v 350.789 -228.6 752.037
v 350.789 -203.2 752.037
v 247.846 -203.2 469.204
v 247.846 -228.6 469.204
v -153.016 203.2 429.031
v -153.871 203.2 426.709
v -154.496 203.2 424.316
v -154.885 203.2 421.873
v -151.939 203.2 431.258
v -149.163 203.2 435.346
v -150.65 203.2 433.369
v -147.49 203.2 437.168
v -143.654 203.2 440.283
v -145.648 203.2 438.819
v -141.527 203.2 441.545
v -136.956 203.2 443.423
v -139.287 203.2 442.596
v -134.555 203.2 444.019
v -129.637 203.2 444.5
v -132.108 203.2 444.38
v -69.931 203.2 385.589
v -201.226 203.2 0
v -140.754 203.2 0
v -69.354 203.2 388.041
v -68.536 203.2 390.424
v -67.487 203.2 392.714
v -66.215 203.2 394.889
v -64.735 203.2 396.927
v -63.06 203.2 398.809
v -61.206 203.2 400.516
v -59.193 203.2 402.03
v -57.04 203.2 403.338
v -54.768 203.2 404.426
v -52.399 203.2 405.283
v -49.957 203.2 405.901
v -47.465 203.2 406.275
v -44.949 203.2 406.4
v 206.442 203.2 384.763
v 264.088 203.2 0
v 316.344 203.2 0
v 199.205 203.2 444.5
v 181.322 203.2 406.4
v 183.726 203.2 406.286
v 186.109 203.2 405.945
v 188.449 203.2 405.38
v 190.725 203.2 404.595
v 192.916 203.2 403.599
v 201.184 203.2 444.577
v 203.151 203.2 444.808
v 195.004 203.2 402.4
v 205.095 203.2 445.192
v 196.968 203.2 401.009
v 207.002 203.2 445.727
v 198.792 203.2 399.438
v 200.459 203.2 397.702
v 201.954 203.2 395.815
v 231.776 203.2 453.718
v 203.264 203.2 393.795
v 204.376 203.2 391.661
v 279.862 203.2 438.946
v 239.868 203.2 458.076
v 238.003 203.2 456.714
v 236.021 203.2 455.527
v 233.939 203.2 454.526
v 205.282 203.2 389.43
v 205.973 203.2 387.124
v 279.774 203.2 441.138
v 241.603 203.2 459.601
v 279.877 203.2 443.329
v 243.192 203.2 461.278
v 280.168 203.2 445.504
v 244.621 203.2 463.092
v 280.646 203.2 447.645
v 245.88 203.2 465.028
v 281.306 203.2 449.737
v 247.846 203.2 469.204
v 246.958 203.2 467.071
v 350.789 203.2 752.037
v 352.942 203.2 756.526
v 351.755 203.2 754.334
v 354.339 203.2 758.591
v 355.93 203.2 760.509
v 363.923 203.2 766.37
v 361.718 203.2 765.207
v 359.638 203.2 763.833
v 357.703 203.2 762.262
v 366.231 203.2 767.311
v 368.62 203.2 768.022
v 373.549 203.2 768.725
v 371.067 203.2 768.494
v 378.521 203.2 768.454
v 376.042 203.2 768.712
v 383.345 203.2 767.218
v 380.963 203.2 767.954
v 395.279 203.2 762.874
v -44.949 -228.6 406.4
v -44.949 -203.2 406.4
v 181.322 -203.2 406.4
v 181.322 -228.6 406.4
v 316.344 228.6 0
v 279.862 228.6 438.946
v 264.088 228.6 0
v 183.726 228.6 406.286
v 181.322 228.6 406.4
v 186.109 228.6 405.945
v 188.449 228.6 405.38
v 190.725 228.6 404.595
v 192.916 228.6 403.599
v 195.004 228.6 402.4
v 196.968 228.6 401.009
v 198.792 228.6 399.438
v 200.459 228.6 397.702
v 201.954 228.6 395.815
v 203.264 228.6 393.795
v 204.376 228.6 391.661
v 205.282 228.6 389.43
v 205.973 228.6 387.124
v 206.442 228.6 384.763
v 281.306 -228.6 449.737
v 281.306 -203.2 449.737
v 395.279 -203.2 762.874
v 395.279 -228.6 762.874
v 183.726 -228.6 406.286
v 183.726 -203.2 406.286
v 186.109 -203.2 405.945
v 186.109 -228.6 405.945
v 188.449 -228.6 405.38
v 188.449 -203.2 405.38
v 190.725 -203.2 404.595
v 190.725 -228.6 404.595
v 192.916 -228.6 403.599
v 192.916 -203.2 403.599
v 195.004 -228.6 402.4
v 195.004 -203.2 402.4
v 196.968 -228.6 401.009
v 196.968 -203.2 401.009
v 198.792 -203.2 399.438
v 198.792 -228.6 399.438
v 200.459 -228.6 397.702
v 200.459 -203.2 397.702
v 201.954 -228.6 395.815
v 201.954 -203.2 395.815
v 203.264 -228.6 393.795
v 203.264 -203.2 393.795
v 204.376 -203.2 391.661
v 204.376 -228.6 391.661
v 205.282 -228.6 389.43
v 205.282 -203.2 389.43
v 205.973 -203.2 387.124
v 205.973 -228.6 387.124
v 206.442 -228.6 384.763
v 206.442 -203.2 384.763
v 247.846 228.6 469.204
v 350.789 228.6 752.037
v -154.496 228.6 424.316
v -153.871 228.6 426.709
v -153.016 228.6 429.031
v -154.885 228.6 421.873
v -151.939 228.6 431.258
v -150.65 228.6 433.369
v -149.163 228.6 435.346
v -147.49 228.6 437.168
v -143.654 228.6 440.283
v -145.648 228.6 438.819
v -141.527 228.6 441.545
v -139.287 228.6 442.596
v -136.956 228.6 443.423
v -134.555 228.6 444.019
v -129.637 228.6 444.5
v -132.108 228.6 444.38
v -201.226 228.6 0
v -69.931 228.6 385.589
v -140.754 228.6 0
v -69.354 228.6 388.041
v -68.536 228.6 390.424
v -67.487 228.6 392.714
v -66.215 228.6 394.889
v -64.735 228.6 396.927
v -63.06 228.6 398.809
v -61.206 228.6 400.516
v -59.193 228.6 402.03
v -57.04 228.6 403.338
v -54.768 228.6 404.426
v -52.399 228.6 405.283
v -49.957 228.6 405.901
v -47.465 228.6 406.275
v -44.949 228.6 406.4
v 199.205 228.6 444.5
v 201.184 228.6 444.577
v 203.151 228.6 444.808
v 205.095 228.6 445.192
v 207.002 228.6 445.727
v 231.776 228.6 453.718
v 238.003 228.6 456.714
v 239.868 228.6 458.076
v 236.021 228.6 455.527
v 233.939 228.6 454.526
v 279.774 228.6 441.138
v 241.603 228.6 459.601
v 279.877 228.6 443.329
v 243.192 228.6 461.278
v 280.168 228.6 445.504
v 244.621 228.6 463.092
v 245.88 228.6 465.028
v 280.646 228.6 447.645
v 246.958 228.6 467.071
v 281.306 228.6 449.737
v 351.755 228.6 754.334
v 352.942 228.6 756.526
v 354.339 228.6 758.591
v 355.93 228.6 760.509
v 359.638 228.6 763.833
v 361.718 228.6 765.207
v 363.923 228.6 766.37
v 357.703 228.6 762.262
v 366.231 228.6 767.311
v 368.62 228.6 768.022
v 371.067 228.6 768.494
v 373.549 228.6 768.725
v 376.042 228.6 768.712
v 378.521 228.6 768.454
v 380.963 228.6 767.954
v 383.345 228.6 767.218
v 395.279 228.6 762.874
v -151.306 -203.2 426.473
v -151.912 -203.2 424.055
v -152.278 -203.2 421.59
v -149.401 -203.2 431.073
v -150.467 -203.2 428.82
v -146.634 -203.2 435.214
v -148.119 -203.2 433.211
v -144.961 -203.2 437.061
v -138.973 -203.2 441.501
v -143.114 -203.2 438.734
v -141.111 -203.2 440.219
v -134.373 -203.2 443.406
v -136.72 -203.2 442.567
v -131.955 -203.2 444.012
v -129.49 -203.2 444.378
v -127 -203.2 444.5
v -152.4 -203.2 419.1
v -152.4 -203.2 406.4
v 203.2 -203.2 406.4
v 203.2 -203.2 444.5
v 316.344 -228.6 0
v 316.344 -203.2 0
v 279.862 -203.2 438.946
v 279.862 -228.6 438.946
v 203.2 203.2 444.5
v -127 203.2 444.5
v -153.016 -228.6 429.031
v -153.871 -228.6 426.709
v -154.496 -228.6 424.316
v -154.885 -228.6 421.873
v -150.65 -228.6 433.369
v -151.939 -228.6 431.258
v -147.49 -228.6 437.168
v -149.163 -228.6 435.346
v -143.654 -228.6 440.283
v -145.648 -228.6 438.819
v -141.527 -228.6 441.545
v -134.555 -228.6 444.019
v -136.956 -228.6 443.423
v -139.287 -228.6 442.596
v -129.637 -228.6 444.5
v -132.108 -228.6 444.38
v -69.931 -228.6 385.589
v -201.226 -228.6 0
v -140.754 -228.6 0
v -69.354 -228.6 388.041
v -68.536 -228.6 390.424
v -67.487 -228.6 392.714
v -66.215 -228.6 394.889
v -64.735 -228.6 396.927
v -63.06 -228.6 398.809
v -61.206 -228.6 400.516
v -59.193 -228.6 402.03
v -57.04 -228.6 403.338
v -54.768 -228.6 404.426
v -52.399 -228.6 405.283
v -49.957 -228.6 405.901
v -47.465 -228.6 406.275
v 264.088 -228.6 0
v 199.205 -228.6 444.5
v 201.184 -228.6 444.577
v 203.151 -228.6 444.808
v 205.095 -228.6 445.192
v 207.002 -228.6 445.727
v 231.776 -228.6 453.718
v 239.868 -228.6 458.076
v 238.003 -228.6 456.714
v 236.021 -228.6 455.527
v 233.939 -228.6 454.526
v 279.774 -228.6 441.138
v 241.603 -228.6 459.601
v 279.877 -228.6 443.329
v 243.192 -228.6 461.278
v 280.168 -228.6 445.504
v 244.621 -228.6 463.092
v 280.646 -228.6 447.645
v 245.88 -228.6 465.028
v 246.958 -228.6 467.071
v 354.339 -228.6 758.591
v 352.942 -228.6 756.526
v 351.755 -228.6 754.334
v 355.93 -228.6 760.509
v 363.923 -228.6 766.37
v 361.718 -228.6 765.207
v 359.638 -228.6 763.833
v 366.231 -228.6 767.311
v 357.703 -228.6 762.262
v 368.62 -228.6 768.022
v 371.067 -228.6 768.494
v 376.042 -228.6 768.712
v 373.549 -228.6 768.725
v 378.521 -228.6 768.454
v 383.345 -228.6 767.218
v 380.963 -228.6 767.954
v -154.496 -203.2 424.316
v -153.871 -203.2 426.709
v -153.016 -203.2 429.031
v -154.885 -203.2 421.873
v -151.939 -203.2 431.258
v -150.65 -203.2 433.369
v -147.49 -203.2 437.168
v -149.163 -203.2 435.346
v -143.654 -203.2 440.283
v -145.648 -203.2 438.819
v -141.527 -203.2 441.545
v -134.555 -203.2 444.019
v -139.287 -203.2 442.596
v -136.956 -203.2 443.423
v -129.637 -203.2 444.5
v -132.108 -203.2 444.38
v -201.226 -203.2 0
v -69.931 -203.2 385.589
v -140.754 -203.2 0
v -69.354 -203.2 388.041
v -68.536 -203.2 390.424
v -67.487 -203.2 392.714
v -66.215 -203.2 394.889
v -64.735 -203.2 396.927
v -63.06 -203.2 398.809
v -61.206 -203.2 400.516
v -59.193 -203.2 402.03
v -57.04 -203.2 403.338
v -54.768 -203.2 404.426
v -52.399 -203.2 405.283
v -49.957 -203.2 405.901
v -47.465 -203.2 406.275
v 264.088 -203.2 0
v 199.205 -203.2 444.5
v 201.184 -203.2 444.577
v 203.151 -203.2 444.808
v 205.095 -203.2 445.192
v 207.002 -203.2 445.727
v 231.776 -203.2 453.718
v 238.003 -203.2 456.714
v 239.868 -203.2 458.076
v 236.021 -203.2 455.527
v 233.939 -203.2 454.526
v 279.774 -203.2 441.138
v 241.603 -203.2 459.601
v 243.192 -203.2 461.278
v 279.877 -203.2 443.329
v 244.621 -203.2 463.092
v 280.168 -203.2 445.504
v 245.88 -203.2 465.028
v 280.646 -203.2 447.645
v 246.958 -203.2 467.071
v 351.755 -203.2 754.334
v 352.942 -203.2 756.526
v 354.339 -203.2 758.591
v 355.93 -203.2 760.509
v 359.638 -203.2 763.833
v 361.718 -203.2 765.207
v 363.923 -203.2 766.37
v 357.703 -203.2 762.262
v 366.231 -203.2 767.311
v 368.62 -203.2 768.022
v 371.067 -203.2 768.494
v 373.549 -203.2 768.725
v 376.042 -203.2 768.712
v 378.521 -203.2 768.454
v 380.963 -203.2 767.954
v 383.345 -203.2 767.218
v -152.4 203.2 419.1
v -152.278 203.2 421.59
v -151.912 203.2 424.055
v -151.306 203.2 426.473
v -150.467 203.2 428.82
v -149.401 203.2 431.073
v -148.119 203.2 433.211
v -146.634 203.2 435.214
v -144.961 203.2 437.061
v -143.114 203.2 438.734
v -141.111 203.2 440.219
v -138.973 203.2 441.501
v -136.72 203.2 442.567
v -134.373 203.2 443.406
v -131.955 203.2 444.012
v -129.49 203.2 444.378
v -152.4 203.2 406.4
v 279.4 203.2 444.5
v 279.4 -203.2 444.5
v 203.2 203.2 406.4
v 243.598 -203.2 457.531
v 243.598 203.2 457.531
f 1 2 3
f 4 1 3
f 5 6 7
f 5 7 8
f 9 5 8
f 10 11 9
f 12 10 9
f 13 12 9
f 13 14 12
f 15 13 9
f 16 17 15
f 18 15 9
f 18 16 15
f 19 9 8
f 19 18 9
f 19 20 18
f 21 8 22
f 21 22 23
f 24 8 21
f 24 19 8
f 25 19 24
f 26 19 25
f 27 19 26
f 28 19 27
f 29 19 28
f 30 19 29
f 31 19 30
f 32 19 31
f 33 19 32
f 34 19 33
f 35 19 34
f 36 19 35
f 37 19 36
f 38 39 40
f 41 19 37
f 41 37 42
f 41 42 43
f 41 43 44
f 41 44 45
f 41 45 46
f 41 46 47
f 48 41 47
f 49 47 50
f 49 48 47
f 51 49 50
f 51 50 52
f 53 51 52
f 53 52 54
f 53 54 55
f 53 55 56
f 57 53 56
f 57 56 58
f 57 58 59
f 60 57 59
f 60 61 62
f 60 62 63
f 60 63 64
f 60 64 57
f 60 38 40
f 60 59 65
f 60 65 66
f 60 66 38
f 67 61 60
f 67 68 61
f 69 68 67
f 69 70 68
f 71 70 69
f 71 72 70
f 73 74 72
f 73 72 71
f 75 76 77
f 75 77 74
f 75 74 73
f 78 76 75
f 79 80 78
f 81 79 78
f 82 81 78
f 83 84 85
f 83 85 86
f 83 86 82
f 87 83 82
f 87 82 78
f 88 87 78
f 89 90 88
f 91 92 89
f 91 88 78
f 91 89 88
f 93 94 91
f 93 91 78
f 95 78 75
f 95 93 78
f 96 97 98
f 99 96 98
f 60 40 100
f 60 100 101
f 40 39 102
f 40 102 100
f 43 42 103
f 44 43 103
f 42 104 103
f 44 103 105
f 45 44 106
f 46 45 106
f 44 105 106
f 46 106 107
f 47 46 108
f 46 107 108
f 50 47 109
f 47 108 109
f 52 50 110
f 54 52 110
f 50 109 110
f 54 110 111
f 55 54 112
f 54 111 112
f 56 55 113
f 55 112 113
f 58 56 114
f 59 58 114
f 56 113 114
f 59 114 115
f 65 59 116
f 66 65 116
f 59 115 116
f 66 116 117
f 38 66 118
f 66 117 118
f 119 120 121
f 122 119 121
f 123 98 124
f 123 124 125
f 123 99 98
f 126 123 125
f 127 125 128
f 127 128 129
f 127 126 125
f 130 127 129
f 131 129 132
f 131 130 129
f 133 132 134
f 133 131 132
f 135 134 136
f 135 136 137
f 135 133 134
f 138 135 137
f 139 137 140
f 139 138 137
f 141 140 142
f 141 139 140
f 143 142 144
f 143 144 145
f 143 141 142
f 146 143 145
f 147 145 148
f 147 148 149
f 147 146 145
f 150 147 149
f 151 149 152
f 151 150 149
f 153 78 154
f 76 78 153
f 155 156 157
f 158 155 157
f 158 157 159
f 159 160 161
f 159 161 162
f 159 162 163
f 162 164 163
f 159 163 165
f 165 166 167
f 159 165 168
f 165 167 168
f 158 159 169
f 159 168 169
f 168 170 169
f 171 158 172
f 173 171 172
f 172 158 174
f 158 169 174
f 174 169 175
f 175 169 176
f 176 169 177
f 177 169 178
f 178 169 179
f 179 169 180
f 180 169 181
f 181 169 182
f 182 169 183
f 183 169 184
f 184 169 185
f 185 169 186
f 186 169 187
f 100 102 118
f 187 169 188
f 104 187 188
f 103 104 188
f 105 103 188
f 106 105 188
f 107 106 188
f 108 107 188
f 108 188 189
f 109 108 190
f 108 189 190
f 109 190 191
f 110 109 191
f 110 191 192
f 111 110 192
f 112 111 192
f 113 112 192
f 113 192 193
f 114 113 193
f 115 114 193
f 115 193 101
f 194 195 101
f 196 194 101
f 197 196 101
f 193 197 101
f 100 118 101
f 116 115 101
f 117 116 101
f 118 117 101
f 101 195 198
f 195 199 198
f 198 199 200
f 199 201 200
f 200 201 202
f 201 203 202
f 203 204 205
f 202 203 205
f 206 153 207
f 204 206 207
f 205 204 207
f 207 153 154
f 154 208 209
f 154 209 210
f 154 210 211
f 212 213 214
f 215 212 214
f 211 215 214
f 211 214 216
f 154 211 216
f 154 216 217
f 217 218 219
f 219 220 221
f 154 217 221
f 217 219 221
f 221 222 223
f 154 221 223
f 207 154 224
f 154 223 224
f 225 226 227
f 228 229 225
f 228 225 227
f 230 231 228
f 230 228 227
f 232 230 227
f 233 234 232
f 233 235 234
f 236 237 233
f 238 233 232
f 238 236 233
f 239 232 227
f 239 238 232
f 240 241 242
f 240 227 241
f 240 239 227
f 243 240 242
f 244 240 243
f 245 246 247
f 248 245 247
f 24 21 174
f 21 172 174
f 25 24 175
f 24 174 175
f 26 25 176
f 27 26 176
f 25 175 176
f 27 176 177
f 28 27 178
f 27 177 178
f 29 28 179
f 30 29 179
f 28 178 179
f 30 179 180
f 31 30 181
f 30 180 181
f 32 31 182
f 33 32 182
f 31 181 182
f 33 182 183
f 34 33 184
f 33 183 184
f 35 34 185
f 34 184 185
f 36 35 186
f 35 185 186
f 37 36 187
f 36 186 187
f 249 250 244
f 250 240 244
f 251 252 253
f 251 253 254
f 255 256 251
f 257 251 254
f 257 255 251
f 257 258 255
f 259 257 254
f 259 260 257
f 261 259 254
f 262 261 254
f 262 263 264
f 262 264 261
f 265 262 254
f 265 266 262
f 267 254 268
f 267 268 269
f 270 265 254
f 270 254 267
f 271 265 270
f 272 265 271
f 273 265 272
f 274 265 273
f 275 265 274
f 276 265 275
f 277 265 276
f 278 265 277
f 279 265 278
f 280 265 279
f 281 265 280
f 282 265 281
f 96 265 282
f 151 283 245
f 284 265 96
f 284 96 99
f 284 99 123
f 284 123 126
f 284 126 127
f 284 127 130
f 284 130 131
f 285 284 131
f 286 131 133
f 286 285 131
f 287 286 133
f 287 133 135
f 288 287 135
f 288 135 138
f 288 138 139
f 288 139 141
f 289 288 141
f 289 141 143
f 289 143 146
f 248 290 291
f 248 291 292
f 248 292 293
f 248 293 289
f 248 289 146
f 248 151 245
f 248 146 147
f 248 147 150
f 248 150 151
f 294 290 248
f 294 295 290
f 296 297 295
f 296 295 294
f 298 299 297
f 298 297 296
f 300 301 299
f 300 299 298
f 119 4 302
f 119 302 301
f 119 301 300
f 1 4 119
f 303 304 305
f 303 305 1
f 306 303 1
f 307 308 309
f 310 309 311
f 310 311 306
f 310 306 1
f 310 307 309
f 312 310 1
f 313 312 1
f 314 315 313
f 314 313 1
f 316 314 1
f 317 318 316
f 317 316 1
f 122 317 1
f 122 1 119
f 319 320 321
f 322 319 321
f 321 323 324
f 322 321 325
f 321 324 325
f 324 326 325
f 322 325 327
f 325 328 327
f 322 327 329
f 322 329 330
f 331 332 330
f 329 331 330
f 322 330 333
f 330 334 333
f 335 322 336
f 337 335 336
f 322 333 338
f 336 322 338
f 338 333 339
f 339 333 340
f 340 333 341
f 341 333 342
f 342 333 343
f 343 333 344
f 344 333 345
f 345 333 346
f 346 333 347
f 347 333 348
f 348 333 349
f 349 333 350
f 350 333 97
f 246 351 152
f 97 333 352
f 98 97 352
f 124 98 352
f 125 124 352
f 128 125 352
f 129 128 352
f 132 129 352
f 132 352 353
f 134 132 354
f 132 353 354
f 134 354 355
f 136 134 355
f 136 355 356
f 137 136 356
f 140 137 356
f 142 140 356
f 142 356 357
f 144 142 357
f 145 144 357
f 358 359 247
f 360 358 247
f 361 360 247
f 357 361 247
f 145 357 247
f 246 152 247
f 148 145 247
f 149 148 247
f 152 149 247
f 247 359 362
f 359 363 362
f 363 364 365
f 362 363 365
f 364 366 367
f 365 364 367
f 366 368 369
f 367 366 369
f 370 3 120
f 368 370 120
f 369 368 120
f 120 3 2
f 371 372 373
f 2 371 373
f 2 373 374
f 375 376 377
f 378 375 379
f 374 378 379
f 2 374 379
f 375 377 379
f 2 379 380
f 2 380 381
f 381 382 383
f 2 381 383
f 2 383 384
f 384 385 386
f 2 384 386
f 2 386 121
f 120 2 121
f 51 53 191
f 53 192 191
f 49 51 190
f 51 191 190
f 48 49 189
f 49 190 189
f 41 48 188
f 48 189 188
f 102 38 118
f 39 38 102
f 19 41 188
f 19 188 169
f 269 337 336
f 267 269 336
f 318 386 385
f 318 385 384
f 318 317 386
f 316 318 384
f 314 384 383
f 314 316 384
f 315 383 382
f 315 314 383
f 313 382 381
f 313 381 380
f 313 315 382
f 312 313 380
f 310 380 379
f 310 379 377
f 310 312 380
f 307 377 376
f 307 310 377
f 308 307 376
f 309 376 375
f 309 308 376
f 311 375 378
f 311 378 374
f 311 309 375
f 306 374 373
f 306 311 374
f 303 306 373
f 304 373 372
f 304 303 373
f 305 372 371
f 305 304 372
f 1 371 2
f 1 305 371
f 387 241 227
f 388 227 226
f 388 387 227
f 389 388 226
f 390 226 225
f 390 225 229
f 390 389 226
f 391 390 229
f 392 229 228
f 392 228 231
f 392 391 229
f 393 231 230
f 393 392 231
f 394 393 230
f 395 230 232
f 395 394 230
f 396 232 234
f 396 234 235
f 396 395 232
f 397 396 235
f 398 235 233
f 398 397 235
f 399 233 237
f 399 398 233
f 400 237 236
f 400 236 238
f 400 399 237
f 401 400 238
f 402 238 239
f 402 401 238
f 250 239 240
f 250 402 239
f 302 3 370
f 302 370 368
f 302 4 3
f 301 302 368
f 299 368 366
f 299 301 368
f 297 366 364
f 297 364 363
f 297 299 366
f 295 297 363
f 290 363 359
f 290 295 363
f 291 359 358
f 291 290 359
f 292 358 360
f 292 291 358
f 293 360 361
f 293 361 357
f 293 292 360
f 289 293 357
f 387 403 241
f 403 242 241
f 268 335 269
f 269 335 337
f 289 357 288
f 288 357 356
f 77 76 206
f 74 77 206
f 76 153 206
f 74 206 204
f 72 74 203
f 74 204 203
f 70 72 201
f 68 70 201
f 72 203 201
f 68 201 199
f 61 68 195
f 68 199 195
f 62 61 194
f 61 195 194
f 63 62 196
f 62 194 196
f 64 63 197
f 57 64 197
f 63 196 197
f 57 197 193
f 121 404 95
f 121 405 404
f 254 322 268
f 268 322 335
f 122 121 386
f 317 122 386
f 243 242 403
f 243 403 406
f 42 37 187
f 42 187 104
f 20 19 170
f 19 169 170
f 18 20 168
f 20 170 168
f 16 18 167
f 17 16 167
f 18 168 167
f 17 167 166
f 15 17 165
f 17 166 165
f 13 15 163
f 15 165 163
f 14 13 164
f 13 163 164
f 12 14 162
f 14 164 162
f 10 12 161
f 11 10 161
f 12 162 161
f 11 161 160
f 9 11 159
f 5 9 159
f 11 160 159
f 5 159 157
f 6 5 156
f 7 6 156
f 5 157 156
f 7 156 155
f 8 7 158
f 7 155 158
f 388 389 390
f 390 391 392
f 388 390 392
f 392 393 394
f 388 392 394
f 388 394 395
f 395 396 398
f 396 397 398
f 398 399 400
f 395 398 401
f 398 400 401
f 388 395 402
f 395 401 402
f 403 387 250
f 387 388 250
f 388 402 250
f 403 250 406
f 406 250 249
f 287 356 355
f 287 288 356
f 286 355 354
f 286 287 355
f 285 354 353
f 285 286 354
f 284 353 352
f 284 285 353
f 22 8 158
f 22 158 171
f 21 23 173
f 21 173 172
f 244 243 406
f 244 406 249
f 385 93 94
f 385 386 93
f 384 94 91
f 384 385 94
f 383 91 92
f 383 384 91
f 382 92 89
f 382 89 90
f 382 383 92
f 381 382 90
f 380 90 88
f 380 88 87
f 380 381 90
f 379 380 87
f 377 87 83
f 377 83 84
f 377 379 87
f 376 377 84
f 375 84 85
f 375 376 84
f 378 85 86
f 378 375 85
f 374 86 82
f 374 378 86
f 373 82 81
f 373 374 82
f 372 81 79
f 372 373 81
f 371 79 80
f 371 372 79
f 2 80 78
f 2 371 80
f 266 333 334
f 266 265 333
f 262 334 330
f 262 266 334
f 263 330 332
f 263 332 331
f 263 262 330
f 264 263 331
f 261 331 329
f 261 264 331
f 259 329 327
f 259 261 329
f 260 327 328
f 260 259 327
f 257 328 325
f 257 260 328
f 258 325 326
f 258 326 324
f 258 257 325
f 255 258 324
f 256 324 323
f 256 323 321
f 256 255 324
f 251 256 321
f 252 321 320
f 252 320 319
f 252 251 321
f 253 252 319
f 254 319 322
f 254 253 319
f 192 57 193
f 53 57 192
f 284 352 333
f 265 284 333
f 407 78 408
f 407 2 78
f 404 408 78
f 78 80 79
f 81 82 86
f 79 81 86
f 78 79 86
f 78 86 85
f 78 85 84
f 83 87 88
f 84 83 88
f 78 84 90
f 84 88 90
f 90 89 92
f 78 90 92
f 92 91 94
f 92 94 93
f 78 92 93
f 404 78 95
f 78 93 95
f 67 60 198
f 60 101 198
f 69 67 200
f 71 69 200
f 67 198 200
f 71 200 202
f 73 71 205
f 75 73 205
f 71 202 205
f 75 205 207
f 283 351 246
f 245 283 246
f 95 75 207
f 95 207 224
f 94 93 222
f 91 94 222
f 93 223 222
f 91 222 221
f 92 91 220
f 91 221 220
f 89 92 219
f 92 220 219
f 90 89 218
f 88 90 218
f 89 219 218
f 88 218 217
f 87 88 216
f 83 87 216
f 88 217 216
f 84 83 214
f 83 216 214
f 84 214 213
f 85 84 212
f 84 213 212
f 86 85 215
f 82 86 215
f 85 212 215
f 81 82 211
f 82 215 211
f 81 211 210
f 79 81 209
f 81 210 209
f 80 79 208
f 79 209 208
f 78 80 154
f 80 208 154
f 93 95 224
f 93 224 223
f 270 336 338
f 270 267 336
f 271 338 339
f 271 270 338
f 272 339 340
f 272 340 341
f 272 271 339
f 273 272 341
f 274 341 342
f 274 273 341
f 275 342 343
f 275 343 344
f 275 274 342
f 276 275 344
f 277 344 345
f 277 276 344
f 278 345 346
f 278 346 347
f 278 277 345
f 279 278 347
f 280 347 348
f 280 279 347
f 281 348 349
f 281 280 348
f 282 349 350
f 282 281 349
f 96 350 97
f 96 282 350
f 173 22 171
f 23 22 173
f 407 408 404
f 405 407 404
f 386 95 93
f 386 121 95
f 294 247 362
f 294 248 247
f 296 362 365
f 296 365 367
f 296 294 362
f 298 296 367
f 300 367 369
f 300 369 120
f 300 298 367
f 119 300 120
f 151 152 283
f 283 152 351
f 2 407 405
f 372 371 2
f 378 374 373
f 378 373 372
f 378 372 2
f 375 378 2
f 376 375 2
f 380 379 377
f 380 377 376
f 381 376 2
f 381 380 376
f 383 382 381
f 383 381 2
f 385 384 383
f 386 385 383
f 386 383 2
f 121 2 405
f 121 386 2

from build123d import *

# Parameters (mm, degrees)
F0_W          = 355.6
F0_H          = 38.1
F1_DEPTH      = 203.2
F1_DEPTH_BACK = 203.2
F4_DEPTH      = 25.4
F5_R          = 25.4
F5_2_R        = 25.4
F5_3_R        = 25.4


with BuildPart() as f1:
    # F0 (on Front) → F1 (new body, two sides)
    with BuildSketch(Plane.XZ) as f1_sk:
        with Locations((25.4, 425.45)):
            Rectangle(F0_W, F0_H)
    extrude(amount=F1_DEPTH)
    extrude(f1_sk.sketch, amount=-F1_DEPTH_BACK)

    # F5
    f5_edges = [f1.edges().sort_by_distance(p)[0] for p in [
        (-152.4, 0, 444.5),
    ]]
    fillet(f5_edges, radius=F5_R)


with BuildPart() as f1b:
    # F0 (on Front) → F1, piece 2 (new body, two sides)
    with BuildSketch(Plane.XZ) as f1_2_sk:
        Polygon((395.2786490417, 762.8739716389), (359.4763601897, 775.9049390996), (243.5977111481, 457.5309674607), (279.4, 444.5), align=None)
    extrude(amount=F1_DEPTH)
    extrude(f1_2_sk.sketch, amount=-F1_DEPTH_BACK)

    # F5#3
    f5_3_edges = [f1b.edges().sort_by_distance(p)[0] for p in [
        (359.47636, 0, 775.904939),
    ]]
    fillet(f5_3_edges, radius=F5_3_R)


with BuildPart() as f4:
    # F3 (on offset) → F4 (new body)
    with BuildSketch(Plane.XZ.offset(203.2)):
        Polygon((316.3440227509, 0), (279.4, 444.5), (395.2786490417, 762.8739716389), (359.4763601897, 775.9049390996), (243.5977111481, 457.5309674607), (203.2, 444.5), (-152.4, 444.5), (-201.2257277966, 0), (-140.7537162304, 0), (-66.108584404, 406.4), (203.2, 406.4), (264.0878558159, 0), align=None)
    extrude(amount=F4_DEPTH)

    # F5#2
    f5_2_edges = [f4.edges().sort_by_distance(p)[0] for p in [
        (-152.4, -215.9, 444.5),
        (359.47636, -215.9, 775.904939),
        (203.2, -215.9, 444.5),
        (243.597711, -215.9, 457.530967),
        (279.4, -215.9, 444.5),
        (203.2, -215.9, 406.4),
        (-66.108584, -215.9, 406.4),
    ]]
    fillet(f5_2_edges, radius=F5_2_R)


with BuildPart() as f6_1:
    # F6: instance of F4
    add(f4.part.mirror(Plane.XZ))


solid = Compound([f1.part, f1b.part, f4.part, f6_1.part])
